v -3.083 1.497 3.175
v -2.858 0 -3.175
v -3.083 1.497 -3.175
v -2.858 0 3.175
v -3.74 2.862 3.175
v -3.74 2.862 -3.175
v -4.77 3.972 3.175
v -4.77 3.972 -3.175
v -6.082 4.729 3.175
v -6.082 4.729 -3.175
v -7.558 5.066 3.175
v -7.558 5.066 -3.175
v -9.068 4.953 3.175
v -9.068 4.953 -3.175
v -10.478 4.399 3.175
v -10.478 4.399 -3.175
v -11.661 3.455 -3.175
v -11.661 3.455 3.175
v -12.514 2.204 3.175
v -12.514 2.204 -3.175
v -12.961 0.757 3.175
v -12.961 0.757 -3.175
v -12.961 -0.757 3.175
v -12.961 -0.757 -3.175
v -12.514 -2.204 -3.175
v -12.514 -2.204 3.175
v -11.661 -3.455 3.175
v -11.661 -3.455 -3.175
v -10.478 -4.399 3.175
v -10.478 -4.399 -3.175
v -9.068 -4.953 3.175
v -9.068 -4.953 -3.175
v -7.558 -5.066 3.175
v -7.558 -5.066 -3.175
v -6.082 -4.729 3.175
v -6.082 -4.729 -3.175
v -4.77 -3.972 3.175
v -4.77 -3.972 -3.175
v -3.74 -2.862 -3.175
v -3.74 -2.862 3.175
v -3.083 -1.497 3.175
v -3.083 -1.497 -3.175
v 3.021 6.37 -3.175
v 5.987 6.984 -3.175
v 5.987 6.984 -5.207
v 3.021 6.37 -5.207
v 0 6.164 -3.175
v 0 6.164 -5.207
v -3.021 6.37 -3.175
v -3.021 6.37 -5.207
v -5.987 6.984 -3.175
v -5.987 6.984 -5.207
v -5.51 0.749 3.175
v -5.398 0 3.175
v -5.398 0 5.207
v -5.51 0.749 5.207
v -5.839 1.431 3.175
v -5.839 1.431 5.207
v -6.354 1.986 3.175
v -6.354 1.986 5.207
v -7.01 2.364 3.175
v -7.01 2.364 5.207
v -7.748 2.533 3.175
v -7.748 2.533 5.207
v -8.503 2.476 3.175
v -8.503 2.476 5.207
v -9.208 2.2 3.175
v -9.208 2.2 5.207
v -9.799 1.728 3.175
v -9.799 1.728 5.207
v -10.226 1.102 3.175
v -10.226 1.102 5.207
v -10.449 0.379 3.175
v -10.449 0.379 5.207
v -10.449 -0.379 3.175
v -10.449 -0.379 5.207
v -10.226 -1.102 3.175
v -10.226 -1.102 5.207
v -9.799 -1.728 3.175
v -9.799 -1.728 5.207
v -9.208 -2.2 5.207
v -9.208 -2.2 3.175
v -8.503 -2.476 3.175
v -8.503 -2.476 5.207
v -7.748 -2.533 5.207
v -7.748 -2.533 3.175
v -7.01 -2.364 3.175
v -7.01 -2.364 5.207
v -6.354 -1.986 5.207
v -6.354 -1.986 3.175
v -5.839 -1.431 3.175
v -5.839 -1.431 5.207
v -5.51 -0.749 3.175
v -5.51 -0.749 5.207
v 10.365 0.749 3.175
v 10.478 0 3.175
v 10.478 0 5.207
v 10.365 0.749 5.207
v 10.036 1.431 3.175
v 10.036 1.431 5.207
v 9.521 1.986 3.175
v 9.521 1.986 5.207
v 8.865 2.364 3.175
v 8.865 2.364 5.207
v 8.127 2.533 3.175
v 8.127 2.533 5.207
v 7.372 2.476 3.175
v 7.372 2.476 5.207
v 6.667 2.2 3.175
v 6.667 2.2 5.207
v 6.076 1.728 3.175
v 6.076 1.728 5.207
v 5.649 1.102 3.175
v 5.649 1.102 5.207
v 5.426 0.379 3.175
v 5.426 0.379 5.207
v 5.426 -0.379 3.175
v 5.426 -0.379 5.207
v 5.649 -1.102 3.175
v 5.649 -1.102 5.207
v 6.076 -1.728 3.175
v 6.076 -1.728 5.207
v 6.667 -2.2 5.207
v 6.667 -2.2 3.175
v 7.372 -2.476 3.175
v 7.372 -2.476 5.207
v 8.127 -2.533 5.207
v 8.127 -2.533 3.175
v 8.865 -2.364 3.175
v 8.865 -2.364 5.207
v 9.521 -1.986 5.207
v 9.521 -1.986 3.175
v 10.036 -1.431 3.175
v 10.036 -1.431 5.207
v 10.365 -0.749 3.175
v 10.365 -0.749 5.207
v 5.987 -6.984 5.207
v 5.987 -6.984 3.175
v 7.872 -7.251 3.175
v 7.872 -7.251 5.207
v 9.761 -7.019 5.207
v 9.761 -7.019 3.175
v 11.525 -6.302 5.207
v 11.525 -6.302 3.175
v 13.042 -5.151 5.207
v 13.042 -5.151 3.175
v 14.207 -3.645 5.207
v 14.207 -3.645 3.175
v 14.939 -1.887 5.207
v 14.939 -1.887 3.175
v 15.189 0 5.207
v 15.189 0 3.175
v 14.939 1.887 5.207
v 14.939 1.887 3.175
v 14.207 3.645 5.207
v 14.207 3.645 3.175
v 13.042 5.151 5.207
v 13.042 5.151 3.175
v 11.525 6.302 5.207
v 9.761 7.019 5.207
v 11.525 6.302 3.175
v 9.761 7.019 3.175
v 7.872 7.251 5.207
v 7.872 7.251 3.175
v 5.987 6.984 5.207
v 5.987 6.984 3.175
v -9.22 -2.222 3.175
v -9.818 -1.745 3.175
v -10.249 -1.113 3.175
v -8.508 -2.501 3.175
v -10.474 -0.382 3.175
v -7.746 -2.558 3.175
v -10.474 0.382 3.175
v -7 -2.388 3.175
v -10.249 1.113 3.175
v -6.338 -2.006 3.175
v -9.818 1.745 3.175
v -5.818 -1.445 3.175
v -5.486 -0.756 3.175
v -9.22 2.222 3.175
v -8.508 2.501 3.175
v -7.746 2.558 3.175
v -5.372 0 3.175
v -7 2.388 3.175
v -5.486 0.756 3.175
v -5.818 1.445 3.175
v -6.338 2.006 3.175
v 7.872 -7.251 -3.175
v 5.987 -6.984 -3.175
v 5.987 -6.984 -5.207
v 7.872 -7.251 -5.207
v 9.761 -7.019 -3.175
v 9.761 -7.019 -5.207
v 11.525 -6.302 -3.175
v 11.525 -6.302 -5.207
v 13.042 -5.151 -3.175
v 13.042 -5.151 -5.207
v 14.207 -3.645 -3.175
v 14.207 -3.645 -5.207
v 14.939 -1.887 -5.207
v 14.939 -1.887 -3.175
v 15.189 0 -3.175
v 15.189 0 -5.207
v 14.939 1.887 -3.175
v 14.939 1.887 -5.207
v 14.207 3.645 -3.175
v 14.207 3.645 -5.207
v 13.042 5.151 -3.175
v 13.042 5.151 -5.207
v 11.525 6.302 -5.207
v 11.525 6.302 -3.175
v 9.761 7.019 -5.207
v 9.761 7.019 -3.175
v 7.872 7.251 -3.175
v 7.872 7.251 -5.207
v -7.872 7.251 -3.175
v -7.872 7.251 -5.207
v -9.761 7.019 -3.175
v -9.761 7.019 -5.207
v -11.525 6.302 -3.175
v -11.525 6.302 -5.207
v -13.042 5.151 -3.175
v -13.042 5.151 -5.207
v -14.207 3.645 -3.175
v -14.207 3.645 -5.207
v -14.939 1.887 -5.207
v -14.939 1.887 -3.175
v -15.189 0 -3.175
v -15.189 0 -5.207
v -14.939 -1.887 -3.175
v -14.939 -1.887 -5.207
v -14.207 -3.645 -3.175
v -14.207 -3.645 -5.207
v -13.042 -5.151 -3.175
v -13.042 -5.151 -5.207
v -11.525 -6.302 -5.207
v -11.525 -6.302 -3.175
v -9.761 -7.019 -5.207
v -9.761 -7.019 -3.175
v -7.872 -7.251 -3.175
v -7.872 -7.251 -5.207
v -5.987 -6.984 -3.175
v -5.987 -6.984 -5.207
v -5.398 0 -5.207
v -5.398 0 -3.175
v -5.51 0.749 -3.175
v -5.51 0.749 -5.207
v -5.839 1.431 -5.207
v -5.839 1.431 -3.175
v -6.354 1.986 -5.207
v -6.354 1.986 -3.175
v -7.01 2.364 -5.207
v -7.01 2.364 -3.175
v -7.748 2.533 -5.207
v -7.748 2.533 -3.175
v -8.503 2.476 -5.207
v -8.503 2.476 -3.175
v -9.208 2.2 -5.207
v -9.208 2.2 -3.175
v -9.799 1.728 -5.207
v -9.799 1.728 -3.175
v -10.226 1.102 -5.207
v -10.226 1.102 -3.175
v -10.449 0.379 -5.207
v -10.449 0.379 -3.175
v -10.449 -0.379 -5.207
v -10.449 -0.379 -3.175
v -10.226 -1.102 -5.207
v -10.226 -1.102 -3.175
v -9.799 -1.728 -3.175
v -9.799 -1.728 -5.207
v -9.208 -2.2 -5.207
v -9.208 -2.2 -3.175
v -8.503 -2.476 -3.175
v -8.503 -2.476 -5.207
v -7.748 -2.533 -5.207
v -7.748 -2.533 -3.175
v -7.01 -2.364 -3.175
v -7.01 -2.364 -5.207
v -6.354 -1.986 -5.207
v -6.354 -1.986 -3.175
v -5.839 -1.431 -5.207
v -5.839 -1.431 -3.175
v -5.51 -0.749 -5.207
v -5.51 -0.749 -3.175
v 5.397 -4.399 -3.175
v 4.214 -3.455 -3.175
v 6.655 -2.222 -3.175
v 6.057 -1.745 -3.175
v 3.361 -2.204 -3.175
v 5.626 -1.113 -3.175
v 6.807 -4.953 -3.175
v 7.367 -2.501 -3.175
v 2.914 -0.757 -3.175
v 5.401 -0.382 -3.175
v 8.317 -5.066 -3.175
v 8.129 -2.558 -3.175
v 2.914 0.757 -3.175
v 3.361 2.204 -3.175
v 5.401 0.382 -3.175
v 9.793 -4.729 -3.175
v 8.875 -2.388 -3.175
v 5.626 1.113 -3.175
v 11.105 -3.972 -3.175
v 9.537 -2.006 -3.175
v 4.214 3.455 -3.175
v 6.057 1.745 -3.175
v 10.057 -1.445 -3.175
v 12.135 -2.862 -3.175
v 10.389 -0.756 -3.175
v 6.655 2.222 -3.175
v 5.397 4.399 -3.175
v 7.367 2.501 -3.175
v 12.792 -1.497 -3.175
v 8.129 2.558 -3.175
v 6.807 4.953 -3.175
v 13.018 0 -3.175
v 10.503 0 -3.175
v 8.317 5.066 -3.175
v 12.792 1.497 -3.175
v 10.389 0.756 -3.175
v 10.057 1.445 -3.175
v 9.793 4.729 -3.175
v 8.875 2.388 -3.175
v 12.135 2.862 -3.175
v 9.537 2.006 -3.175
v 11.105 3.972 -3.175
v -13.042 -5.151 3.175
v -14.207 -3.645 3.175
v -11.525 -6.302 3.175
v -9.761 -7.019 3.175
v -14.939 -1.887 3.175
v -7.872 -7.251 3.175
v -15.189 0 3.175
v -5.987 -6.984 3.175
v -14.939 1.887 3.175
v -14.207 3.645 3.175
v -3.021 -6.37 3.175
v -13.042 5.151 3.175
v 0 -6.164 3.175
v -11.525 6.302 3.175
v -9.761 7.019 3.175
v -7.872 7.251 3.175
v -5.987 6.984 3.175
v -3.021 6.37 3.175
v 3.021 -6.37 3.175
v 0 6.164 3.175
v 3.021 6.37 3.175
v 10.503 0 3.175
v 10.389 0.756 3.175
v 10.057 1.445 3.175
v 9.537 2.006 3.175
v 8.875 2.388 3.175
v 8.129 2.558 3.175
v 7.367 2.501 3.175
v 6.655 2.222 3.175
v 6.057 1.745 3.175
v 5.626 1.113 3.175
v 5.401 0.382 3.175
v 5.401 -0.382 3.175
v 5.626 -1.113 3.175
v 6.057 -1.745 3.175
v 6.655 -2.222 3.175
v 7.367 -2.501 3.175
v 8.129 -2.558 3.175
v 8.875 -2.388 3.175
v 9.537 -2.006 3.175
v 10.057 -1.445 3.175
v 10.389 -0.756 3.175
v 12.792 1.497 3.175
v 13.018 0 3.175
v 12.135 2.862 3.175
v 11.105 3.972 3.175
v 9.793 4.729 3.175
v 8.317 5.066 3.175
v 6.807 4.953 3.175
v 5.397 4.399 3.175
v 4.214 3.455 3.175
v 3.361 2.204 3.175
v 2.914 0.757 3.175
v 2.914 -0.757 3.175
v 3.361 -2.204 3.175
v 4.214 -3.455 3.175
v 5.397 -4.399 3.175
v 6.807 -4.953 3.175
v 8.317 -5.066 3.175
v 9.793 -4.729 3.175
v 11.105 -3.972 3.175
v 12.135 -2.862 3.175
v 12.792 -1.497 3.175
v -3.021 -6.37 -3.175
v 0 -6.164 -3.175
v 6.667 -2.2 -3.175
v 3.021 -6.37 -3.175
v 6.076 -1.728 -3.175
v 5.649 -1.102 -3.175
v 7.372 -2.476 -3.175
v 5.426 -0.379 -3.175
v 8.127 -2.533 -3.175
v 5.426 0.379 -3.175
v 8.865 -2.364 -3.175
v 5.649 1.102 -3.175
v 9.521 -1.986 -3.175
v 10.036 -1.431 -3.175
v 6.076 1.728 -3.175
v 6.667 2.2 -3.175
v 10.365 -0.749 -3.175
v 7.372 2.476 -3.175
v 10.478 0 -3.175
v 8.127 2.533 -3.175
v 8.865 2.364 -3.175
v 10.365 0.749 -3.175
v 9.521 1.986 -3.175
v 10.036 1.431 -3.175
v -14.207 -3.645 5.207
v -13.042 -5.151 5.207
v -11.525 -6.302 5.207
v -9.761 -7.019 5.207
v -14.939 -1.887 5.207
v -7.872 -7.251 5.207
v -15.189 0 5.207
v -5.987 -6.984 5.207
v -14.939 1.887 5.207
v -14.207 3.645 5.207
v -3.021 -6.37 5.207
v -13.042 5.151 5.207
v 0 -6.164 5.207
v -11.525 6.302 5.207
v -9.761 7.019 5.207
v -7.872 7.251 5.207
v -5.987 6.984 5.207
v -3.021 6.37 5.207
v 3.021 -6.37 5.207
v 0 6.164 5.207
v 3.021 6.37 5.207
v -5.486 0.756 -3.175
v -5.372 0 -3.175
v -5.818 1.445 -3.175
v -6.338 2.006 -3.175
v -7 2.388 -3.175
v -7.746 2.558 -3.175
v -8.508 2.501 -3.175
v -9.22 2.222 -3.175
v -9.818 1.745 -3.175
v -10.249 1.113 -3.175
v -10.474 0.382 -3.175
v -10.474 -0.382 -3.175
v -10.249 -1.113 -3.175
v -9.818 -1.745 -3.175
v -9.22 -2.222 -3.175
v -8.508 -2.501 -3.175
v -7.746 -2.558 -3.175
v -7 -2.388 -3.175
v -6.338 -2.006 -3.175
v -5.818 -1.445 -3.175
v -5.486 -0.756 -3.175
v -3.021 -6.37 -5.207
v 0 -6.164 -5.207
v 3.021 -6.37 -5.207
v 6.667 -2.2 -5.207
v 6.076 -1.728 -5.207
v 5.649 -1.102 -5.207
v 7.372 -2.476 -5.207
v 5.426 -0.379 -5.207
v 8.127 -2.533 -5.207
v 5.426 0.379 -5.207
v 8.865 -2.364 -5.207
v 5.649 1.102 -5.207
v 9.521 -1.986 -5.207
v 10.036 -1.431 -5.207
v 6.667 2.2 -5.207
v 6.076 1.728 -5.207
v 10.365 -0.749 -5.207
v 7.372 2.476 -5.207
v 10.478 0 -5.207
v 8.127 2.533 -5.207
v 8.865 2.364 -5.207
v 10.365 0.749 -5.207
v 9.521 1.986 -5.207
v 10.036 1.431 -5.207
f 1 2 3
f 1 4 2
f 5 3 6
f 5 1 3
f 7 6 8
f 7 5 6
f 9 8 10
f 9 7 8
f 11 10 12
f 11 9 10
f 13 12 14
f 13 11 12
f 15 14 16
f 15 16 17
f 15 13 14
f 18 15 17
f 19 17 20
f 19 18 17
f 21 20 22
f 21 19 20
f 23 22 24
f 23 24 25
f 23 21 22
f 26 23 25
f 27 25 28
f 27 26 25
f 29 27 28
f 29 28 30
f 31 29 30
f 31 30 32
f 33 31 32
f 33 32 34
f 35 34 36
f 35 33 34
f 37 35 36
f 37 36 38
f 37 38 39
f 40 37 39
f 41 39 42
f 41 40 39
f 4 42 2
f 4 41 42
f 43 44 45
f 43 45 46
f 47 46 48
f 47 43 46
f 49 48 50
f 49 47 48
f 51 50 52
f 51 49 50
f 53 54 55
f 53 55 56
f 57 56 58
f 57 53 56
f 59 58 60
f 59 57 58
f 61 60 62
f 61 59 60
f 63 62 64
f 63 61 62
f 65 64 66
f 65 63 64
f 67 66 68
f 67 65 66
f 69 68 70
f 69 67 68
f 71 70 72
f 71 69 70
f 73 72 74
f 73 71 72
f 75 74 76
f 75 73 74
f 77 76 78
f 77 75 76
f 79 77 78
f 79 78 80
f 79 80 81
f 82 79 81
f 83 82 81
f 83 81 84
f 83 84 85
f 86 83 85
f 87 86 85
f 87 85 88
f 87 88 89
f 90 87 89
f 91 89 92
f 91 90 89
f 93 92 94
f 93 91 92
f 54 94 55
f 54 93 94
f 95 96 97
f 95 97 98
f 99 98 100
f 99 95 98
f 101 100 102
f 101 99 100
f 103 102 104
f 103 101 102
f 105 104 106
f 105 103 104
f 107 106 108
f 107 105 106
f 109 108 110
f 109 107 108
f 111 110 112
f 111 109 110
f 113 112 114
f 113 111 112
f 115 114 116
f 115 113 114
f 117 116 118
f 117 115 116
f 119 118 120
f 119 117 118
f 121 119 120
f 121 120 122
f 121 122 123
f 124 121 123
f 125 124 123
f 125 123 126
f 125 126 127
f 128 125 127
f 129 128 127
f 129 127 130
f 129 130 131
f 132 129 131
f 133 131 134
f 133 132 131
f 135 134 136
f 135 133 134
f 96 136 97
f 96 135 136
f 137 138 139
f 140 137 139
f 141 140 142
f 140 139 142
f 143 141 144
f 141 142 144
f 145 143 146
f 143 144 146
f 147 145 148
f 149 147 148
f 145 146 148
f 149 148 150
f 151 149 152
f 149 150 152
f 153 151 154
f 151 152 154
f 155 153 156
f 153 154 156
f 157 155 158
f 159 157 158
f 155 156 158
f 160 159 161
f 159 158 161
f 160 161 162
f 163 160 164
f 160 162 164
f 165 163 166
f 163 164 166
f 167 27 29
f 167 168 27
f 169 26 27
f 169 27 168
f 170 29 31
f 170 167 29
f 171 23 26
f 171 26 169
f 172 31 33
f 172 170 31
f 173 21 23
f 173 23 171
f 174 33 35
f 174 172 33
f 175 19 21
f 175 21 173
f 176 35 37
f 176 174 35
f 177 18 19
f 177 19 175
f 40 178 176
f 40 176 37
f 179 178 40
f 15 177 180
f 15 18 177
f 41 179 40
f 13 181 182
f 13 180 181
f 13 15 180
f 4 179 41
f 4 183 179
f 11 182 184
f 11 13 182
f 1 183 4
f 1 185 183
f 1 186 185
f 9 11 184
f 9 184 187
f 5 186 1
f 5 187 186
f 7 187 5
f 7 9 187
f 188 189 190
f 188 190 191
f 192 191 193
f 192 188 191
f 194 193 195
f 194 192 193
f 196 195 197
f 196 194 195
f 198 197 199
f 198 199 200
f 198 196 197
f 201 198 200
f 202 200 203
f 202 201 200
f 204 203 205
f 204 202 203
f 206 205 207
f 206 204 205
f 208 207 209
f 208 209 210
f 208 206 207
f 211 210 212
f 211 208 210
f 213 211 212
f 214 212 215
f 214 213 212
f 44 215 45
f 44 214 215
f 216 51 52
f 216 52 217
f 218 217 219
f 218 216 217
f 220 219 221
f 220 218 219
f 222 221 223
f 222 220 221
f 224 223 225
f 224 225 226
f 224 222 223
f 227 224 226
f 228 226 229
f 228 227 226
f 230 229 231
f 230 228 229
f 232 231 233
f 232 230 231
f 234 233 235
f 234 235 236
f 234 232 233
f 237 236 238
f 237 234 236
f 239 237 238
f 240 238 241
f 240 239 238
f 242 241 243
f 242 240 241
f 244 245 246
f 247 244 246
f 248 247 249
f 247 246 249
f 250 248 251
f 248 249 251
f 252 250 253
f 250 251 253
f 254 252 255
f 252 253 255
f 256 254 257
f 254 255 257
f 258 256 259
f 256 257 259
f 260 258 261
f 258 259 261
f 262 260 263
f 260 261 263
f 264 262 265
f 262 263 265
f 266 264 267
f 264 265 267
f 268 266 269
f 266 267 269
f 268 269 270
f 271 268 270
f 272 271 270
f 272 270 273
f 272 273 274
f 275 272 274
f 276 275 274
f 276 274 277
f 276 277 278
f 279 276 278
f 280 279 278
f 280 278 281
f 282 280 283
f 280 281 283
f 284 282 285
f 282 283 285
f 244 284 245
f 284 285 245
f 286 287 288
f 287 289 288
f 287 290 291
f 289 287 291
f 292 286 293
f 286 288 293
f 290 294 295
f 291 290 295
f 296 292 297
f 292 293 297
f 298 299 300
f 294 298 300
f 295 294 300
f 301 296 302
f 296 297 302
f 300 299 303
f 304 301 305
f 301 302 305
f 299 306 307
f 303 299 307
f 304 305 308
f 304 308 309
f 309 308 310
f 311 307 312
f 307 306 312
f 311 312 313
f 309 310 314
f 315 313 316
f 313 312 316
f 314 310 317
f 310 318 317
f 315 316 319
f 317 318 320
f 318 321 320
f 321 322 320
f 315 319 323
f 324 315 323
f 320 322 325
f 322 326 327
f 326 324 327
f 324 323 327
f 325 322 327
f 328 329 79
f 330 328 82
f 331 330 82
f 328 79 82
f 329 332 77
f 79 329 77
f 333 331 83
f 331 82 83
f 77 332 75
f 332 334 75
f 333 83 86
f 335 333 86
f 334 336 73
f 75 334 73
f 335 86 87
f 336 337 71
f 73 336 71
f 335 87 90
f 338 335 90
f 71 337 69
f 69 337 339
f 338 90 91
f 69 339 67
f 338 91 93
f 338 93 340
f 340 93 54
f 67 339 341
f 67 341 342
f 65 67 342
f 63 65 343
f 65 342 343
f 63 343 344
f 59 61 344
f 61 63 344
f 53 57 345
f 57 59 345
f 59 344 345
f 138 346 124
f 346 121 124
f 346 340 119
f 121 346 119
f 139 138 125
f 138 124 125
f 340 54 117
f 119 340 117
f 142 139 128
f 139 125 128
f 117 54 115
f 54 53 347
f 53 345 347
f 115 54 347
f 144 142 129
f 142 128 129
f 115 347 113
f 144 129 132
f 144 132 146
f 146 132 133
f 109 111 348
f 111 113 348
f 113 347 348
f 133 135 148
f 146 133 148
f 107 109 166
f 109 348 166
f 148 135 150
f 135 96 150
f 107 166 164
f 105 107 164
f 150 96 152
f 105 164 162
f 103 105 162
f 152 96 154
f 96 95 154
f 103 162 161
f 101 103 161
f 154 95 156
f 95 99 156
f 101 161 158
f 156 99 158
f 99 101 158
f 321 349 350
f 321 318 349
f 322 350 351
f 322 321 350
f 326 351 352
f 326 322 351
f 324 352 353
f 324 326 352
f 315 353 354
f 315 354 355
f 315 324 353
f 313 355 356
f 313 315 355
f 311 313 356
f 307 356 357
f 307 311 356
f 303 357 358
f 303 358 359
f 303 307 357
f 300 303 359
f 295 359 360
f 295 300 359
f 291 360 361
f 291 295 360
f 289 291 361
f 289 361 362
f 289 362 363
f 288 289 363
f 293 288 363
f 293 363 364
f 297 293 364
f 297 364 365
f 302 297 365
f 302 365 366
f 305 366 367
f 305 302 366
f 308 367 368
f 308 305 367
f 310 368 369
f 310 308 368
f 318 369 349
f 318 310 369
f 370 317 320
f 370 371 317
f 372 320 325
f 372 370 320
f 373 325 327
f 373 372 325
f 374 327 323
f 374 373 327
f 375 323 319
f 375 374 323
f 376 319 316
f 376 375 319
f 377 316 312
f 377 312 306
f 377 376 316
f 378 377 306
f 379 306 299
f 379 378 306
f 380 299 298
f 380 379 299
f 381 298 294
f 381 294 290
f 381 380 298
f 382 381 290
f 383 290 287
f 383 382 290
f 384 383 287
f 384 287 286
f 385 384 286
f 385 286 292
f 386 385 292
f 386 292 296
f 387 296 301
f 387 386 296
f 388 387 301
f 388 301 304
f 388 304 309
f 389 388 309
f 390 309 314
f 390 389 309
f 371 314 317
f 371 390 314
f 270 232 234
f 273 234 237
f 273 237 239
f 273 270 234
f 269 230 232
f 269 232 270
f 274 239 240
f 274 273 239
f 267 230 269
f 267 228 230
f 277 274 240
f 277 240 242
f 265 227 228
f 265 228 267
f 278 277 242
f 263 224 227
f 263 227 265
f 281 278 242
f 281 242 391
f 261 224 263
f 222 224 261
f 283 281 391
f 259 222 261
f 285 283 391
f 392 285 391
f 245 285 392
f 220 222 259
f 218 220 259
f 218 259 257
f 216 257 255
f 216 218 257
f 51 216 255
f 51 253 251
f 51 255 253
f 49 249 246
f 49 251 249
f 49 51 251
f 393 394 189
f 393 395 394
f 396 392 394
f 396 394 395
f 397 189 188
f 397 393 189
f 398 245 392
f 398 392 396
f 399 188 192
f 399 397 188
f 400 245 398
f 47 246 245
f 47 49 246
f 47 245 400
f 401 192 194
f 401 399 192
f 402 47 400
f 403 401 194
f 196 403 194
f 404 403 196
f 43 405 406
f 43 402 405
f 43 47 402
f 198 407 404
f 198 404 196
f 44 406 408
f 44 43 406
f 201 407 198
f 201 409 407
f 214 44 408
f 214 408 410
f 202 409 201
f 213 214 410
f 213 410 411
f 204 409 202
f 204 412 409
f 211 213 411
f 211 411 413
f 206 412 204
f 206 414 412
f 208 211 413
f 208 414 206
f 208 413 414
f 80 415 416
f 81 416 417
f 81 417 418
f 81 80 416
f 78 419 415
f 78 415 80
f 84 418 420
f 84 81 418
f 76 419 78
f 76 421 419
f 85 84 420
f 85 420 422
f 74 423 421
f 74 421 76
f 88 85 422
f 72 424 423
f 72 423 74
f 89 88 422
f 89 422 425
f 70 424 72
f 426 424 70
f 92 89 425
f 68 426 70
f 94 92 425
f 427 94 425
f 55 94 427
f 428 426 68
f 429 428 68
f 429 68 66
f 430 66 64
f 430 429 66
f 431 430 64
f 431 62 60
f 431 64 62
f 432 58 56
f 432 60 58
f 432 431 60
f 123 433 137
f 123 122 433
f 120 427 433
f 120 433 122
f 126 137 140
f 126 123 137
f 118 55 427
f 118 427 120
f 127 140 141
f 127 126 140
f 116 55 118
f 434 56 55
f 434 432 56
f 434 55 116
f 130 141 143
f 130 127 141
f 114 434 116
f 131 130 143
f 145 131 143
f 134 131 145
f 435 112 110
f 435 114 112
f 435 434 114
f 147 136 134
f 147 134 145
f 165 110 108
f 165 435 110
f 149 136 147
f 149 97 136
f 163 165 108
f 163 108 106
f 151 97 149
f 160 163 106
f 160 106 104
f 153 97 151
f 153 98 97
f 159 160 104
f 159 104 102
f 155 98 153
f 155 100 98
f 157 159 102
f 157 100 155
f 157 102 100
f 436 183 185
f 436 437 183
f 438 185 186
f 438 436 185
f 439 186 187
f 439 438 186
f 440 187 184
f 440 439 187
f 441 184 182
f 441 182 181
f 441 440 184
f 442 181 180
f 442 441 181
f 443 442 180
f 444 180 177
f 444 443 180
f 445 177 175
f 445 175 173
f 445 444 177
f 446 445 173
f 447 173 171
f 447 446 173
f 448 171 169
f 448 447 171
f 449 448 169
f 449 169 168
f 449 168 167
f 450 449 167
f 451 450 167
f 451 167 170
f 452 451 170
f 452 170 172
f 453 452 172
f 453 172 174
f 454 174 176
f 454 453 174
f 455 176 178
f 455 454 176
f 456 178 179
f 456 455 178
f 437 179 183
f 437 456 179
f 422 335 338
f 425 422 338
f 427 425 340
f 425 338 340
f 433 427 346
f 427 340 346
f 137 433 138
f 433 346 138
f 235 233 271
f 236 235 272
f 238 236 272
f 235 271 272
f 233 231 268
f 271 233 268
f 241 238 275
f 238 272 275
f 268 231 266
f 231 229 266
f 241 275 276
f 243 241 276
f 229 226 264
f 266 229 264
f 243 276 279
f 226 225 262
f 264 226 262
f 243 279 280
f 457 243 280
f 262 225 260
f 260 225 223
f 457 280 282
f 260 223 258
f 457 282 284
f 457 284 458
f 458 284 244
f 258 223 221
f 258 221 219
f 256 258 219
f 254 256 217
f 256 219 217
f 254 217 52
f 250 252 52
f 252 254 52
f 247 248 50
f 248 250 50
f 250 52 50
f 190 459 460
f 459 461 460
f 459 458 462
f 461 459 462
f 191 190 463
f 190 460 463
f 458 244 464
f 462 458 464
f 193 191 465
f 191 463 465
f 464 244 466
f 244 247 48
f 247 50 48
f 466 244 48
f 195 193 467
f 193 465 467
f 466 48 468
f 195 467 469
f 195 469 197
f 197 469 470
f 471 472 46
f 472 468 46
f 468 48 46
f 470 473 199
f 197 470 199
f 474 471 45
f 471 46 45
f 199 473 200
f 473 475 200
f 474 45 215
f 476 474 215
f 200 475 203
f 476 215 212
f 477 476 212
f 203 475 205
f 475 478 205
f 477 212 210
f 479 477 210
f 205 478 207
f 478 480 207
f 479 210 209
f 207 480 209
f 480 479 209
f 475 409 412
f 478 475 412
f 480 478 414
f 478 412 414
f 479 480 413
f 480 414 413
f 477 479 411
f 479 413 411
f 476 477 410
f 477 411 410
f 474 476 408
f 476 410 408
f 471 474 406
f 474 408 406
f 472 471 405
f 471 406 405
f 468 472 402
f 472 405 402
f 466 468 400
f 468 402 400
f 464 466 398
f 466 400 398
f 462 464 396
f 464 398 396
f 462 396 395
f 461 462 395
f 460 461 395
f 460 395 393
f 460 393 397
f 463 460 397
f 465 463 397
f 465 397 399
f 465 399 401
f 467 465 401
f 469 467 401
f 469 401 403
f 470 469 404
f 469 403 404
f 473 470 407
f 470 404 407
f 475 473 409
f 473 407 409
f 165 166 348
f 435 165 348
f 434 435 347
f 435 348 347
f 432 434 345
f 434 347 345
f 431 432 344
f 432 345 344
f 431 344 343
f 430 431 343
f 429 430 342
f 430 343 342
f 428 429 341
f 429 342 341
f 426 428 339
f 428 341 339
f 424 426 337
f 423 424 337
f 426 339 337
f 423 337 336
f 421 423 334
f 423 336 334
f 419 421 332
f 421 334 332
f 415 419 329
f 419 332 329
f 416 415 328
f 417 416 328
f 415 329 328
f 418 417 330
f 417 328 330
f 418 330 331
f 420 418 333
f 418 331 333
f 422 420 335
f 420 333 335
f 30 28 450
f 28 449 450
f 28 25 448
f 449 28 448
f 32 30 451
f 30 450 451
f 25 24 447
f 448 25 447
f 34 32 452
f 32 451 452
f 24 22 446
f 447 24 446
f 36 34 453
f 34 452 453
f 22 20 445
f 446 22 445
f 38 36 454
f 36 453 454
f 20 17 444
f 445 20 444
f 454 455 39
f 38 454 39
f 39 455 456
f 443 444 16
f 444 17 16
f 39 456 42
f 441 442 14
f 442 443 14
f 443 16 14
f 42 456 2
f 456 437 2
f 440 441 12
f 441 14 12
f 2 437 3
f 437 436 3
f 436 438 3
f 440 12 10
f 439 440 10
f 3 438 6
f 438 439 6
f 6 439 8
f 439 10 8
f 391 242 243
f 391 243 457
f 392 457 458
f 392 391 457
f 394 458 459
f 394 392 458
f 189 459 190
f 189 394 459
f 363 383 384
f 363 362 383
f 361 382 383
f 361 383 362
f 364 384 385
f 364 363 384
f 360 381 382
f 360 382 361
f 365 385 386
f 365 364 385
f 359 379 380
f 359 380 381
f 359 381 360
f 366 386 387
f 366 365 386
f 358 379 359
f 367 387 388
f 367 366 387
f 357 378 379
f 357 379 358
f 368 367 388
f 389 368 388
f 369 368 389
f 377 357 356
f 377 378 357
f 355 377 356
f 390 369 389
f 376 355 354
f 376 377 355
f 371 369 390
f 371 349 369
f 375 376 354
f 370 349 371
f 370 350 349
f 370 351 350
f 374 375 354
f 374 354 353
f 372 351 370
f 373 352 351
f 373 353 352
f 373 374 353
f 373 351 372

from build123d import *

# Parameters (mm, degrees)
SKETCH4_R                  = 5.08
SKETCH4_R_2                = 2.5654
BOSS_EXTRUDE1_DEPTH        = 3.175
BOSS_EXTRUDE1_2_DEPTH      = 3.175
SKETCH5_R                  = 2.54
BOSS_EXTRUDE2_DEPTH        = 2.032
LPATTERN1_COUNT            = 2
LPATTERN1_PITCH            = 15.875
SKETCH7_R                  = 2.54
BOSS_EXTRUDE3_DEPTH        = 2.032
BOSS_EXTRUDE4_DEPTH        = 10.16
BOSS_EXTRUDE4_DEPTH_BACK   = 10.16
SKETCH8_R                  = 2.54
BOSS_EXTRUDE4_2_DEPTH      = 10.16
BOSS_EXTRUDE4_2_DEPTH_BACK = 10.16


with BuildPart() as part:
    # Sketch4 → Boss-Extrude1 (new, symmetric)
    with BuildSketch(Plane.XY):
        with Locations((-7.9375, 0)):
            Circle(SKETCH4_R)
        with Locations((-7.9375, 0)):
            Circle(SKETCH4_R_2, mode=Mode.SUBTRACT)
    extrude(amount=BOSS_EXTRUDE1_DEPTH, both=True)


with BuildPart() as body_2:
    # Sketch4 → Boss-Extrude1 2 (new, symmetric)
    with BuildSketch(Plane.XY):
        with Locations((7.9375, 0)):
            Circle(SKETCH4_R)
        with Locations((7.9375, 0)):
            Circle(SKETCH4_R_2, mode=Mode.SUBTRACT)
    extrude(amount=BOSS_EXTRUDE1_2_DEPTH, both=True)


with BuildPart() as body_3:
    # Sketch5 → Boss-Extrude2 (new body)
    with BuildSketch(Plane.XY.offset(3.175)):
        with BuildLine():
            ThreePointArc((-5.986592041, 6.984347573), (-15.1892, 0), (-5.986592041, -6.984347573))
            ThreePointArc((-5.986592041, -6.984347573), (0, -6.163945), (5.986592041, -6.984347573))
            ThreePointArc((5.986592041, -6.984347573), (15.1892, 0), (5.986592041, 6.984347573))
            ThreePointArc((5.986592041, 6.984347573), (0, 6.163945), (-5.986592041, 6.984347573))
        make_face()
        with Locations((-7.9375, 0)):
            Circle(SKETCH5_R, mode=Mode.SUBTRACT)
        with Locations((7.9375, 0)):
            Circle(SKETCH5_R, mode=Mode.SUBTRACT)
    extrude(amount=BOSS_EXTRUDE2_DEPTH)


with BuildPart() as lpattern1_1:
    # LPattern1: pattern copy
    add(body_2.part.moved(Location(Vector(1, 0, 0) * (1 * LPATTERN1_PITCH))))


with BuildPart() as body_5:
    # Sketch7 → Boss-Extrude3 (new body)
    with BuildSketch(Plane.XY.offset(-5.2578)):
        with BuildLine():
            ThreePointArc((9.706473173, 6.131412978), (1.556004, 0), (9.706473173, -6.131412978))
            ThreePointArc((9.706473173, -6.131412978), (15.875, -5.259356889), (22.043526827, -6.131412978))
            ThreePointArc((22.043526827, -6.131412978), (30.193996, 0), (22.043526827, 6.131412978))
            ThreePointArc((22.043526827, 6.131412978), (15.875, 5.259356889), (9.706473173, 6.131412978))
        make_face()
        with Locations((7.9375, 0)):
            Circle(SKETCH7_R, mode=Mode.SUBTRACT)
        with Locations((23.8125, 0)):
            Circle(SKETCH7_R, mode=Mode.SUBTRACT)
    extrude(amount=-BOSS_EXTRUDE3_DEPTH)


with BuildPart() as body_6:
    # Mirror1: mirrored copy
    add(body_3.part.mirror(Plane.XY))


with BuildPart() as body_7:
    # Mirror1 2: mirrored copy
    add(body_5.part.mirror(Plane.XY))


with BuildPart() as body_8:
    # Sketch8 → Boss-Extrude4 (new, two sides: drawn at the far end of the back side and taken through both)
    with BuildSketch(Plane.XY.offset(-BOSS_EXTRUDE4_DEPTH_BACK)):
        with Locations((7.9375, 0)):
            Circle(SKETCH8_R)
    extrude(amount=BOSS_EXTRUDE4_DEPTH + BOSS_EXTRUDE4_DEPTH_BACK)


with BuildPart() as body_9:
    # Sketch8 → Boss-Extrude4 2 (new, two sides: drawn at the far end of the back side and taken through both)
    with BuildSketch(Plane.XY.offset(-BOSS_EXTRUDE4_2_DEPTH_BACK)):
        with Locations((23.8125, 0)):
            Circle(SKETCH8_R)
    extrude(amount=BOSS_EXTRUDE4_2_DEPTH + BOSS_EXTRUDE4_2_DEPTH_BACK)


solid = Compound([part.part, body_2.part, body_3.part, body_6.part])
